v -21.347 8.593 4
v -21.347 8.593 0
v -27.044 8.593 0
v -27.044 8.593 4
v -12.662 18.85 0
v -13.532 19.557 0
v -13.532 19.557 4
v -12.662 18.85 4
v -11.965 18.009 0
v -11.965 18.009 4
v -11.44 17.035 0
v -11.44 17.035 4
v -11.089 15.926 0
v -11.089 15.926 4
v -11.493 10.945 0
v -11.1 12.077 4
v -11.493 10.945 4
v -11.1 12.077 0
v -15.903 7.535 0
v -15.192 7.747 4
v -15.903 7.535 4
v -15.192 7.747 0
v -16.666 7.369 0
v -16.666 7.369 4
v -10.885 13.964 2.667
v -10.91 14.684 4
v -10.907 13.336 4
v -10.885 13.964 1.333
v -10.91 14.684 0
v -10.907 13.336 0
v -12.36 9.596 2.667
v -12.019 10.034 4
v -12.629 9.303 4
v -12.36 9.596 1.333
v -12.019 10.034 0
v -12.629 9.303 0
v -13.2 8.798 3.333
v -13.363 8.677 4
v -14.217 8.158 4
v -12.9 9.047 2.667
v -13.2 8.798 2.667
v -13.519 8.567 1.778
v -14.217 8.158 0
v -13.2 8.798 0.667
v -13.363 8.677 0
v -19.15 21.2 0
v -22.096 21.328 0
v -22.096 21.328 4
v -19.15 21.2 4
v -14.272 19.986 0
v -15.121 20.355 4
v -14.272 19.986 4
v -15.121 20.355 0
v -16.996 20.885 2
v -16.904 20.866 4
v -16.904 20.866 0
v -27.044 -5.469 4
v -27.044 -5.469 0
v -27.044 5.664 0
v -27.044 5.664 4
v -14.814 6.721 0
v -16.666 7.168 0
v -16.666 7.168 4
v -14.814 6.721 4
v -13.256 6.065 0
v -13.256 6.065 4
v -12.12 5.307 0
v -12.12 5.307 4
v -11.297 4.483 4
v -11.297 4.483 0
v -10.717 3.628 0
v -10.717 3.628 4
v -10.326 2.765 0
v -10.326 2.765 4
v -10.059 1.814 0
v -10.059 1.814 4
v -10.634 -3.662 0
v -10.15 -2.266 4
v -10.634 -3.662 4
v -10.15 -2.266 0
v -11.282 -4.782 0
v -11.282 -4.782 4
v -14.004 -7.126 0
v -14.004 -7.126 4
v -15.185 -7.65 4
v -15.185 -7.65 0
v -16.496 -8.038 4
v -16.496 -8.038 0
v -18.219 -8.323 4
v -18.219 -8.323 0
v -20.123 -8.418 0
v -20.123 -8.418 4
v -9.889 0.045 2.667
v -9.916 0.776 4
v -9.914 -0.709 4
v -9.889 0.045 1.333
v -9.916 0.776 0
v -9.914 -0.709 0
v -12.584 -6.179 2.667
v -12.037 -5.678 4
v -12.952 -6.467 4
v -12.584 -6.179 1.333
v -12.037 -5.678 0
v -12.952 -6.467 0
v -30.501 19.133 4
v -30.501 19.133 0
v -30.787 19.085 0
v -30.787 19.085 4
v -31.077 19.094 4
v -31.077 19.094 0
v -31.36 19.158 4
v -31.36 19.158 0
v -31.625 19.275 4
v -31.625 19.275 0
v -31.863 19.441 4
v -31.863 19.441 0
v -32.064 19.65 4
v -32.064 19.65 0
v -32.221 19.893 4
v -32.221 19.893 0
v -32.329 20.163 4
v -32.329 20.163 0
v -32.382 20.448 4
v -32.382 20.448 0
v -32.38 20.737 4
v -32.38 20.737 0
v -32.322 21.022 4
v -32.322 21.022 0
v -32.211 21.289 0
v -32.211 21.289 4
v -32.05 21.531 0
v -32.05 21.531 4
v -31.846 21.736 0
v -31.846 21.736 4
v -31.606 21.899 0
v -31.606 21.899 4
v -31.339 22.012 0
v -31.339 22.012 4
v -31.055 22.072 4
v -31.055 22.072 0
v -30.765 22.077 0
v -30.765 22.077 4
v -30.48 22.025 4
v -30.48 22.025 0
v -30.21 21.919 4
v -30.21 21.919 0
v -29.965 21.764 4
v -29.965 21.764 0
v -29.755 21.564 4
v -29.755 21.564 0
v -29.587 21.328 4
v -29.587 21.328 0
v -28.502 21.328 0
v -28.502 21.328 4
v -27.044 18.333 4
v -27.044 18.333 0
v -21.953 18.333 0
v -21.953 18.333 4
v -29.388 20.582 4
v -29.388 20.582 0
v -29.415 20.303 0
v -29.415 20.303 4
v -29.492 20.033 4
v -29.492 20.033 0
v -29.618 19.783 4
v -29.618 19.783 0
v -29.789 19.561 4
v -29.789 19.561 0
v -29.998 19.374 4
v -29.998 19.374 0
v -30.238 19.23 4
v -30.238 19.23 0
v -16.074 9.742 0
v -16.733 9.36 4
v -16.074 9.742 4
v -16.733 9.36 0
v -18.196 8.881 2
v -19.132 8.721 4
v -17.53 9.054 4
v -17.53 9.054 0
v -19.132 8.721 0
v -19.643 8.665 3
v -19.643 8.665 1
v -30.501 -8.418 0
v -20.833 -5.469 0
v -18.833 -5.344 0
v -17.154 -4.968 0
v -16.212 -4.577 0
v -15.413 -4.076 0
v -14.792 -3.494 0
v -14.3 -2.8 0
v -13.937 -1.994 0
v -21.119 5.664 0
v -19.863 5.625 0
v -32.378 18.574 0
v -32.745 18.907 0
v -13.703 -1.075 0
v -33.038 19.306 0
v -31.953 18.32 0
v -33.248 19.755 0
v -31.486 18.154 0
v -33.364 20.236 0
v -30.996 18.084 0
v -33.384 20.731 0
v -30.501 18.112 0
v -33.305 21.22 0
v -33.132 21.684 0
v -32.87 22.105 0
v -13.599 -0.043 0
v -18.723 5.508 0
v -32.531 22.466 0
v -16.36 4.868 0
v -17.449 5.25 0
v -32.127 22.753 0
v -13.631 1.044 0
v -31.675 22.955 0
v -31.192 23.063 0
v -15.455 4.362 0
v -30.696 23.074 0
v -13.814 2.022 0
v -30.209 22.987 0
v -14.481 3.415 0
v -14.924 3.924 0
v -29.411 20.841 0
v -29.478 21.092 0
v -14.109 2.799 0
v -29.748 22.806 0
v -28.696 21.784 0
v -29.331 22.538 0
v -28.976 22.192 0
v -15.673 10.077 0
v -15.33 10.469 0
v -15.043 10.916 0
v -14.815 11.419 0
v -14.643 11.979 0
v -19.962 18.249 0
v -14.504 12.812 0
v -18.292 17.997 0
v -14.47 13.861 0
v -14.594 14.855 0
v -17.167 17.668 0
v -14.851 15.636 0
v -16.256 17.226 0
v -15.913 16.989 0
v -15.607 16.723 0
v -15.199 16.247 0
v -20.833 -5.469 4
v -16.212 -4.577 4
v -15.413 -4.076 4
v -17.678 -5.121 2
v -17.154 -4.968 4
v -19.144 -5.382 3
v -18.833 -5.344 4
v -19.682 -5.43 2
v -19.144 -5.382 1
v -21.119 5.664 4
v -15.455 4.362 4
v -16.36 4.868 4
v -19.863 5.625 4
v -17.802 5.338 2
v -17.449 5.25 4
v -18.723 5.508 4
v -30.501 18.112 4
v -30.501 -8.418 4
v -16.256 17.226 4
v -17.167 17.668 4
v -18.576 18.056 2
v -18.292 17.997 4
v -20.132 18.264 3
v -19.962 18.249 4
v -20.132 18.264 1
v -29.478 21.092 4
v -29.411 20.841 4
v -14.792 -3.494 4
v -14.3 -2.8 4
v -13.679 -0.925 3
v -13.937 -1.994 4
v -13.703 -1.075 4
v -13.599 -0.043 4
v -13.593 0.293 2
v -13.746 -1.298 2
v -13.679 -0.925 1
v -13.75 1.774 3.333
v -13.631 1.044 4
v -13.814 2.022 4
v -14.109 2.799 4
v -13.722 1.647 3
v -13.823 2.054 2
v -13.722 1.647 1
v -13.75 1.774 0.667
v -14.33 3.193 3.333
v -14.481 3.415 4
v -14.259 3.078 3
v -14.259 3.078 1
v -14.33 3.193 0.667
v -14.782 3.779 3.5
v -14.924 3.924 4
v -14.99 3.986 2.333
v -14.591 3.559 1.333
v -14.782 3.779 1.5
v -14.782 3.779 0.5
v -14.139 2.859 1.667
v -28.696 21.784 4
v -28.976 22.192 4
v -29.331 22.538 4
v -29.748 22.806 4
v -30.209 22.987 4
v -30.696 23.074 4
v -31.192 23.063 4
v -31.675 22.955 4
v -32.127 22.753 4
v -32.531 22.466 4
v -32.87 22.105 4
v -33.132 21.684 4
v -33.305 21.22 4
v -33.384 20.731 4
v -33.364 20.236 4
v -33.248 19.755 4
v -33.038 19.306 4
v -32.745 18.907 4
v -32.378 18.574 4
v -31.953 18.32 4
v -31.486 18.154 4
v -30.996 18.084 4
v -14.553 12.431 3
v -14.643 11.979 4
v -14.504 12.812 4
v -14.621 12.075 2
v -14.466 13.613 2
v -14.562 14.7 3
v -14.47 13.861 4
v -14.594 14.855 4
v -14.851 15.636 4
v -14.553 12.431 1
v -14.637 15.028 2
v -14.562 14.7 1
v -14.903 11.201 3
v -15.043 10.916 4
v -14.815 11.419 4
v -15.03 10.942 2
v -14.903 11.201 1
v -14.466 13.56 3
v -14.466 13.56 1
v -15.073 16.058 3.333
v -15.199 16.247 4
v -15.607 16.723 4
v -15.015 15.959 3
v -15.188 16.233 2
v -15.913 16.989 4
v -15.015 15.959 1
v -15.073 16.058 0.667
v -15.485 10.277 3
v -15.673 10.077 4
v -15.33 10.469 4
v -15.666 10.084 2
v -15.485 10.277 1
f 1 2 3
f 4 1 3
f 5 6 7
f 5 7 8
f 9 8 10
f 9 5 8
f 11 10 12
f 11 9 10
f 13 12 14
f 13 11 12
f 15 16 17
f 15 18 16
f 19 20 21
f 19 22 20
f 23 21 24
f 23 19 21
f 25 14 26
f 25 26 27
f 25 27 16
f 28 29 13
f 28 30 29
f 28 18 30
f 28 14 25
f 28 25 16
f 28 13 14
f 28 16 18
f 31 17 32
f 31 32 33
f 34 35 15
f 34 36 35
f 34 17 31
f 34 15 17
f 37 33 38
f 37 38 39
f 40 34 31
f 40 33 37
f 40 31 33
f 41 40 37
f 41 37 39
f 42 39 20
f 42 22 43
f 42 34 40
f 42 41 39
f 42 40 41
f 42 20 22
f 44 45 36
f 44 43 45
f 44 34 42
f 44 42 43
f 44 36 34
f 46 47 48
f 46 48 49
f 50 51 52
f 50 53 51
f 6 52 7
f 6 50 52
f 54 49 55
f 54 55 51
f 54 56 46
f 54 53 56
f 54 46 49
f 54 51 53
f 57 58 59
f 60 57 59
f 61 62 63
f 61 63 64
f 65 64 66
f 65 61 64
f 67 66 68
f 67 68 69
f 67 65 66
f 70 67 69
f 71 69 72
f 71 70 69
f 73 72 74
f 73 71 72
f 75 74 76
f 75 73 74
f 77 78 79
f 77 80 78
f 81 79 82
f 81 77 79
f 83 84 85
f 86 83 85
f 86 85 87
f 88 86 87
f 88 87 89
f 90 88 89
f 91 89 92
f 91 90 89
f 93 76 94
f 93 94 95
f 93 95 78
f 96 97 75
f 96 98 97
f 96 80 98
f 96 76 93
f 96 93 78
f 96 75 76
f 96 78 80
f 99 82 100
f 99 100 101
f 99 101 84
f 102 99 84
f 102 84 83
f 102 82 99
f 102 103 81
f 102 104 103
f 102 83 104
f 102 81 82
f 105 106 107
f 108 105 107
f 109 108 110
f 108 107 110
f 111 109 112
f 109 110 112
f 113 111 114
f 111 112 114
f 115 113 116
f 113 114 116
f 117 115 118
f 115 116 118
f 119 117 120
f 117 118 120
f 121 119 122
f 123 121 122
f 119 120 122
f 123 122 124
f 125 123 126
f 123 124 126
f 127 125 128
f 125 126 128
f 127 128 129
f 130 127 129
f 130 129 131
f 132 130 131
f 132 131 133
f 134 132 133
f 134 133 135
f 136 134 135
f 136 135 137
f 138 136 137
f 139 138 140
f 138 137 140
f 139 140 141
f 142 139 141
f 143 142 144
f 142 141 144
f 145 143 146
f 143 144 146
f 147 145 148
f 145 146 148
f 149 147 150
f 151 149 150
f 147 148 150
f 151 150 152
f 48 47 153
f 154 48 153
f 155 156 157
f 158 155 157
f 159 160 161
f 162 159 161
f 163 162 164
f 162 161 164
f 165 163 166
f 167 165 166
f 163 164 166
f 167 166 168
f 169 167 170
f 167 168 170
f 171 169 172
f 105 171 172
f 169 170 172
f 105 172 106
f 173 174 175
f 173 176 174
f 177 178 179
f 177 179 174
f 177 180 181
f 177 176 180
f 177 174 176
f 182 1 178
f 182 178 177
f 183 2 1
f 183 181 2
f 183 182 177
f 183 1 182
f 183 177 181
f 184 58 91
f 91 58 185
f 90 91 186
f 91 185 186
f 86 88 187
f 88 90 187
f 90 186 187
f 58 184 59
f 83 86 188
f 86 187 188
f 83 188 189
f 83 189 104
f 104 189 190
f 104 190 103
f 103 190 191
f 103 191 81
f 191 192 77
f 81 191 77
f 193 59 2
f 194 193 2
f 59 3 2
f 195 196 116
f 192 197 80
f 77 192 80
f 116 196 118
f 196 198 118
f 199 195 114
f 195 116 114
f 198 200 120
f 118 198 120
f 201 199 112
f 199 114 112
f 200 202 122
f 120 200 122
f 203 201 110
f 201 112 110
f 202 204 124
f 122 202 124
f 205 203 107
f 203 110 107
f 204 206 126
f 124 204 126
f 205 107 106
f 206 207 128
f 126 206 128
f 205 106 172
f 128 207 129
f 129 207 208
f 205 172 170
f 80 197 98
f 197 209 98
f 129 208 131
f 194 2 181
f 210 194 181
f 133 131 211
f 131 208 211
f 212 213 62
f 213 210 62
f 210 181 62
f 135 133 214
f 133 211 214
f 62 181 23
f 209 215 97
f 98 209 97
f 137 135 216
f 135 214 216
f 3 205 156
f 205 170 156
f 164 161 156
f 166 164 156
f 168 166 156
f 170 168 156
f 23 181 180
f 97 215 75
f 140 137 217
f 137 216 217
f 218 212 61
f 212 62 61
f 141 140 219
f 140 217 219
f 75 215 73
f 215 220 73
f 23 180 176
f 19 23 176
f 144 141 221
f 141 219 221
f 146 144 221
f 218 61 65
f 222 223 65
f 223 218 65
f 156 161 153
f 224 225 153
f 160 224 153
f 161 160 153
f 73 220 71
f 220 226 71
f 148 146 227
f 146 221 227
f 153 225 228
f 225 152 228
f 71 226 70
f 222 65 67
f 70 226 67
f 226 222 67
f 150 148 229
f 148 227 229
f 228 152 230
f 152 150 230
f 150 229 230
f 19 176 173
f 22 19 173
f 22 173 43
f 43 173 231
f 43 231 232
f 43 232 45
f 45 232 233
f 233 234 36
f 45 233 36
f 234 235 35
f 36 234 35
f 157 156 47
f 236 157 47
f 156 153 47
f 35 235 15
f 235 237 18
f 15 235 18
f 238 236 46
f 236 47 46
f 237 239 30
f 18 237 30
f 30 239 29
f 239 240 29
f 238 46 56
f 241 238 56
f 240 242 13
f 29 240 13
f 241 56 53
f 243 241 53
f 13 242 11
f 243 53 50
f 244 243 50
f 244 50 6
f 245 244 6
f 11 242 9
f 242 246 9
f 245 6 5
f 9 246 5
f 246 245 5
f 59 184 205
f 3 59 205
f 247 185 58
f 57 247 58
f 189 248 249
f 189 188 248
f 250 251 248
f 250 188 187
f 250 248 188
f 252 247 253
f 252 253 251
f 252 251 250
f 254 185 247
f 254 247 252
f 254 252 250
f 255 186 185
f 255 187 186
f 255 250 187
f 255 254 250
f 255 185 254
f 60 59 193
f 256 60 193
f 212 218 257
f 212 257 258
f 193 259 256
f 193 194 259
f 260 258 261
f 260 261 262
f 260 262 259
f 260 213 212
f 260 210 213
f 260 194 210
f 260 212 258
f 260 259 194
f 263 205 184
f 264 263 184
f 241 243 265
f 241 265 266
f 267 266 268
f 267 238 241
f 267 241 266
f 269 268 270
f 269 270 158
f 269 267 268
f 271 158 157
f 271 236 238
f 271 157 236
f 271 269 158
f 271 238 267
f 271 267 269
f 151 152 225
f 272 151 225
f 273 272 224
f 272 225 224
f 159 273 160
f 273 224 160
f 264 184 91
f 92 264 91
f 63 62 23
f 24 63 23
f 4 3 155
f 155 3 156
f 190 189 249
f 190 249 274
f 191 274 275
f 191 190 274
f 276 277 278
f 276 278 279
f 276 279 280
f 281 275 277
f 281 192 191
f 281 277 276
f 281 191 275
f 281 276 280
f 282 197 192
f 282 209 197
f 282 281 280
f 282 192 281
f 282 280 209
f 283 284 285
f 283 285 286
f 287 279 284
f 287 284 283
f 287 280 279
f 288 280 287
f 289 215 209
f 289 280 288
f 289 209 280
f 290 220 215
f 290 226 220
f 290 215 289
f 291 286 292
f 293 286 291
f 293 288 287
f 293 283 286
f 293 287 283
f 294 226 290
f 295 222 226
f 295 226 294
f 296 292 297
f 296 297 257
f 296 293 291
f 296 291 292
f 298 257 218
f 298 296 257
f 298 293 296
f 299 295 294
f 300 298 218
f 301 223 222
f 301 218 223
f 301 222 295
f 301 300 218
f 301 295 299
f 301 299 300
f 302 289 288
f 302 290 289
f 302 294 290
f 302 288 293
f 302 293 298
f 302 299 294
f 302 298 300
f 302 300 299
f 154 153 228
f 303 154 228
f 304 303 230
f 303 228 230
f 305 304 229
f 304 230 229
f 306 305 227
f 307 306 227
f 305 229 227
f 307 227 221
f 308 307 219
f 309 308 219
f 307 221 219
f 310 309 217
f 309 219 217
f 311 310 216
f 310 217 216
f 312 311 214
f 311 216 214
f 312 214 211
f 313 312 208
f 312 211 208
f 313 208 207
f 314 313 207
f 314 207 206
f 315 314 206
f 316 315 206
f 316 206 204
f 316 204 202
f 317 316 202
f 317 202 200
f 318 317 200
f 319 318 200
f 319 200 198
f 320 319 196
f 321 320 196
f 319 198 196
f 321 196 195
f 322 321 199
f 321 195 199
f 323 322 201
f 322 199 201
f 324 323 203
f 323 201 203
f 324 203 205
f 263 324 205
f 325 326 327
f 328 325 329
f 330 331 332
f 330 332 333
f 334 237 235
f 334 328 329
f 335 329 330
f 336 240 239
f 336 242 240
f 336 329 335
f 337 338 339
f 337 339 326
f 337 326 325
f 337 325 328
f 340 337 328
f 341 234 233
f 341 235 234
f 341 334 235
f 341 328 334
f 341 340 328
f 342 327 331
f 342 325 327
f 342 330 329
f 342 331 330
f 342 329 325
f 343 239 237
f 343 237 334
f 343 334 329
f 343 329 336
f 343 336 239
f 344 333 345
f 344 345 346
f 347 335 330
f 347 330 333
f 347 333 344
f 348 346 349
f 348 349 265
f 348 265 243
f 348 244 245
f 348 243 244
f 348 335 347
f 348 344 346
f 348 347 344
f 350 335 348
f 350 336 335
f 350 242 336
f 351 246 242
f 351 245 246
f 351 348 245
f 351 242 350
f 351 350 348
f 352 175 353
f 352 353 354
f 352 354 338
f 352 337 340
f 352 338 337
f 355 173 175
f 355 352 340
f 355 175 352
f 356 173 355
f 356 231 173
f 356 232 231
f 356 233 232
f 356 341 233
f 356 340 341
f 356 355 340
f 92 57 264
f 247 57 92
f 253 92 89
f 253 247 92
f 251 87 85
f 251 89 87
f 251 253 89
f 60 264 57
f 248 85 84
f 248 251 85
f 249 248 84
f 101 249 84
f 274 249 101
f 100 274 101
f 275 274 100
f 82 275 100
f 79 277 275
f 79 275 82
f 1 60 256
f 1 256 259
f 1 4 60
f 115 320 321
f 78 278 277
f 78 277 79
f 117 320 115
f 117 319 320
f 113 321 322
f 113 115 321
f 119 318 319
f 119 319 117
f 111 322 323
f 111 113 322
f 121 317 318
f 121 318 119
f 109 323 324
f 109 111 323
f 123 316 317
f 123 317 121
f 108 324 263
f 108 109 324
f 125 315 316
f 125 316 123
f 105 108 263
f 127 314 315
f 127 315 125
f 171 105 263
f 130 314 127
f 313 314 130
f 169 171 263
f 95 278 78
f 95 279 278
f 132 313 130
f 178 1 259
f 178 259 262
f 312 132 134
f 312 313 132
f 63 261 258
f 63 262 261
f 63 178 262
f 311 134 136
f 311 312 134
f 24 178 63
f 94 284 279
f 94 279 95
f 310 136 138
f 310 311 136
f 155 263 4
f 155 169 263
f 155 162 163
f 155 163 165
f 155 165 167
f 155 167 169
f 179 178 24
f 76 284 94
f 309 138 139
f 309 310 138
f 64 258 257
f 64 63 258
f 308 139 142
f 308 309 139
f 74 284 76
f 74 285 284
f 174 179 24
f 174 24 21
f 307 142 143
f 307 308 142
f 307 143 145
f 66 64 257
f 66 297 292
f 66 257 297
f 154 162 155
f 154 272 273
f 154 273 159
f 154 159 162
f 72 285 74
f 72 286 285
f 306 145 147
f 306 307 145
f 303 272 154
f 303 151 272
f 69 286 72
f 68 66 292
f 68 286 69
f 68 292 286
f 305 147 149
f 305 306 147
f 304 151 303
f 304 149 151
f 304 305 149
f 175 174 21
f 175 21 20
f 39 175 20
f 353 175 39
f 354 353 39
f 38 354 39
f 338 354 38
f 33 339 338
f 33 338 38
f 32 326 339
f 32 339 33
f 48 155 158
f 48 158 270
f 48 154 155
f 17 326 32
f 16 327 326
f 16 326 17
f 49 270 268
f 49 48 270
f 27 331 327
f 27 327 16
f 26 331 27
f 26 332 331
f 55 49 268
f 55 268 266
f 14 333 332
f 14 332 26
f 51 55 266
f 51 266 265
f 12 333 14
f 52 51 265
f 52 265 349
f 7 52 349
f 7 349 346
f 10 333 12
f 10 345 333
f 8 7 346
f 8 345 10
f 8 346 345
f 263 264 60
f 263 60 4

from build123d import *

# Parameters (mm, degrees)
F1_DEPTH = 4


with BuildPart() as f1:
    # F0 (on Top) → F1 (new body)
    with BuildSketch(Plane.XY):
        with BuildLine():
            ThreePointArc((-29.5870762934, 21.3277260357), (-29.4388915489, 20.9676838727), (-29.3883618563, 20.5816322857))
            ThreePointArc((-29.3883618563, 20.5816322857), (-29.6986024925, 19.6681375368), (-30.5009920647, 19.1325137106))
            Line((-30.5009920647, 19.1325137106), (-30.5009920647, 18.111825685))
            ThreePointArc((-30.5009920647, 18.111825685), (-28.988569173, 18.9565822063), (-28.3883618563, 20.5816322857))
            ThreePointArc((-28.3883618563, 20.5816322857), (-28.4170077365, 20.9590032096), (-28.5022889077, 21.3277260357))
            Line((-28.5022889077, 21.3277260357), (-29.5870762934, 21.3277260357))
        make_face()
        with BuildLine():
            ThreePointArc((-30.5009920647, 19.1325137106), (-32.2731465019, 21.1581489683), (-29.5870762934, 21.3277260357))
            Line((-29.5870762934, 21.3277260357), (-28.5022889077, 21.3277260357))
            ThreePointArc((-28.5022889077, 21.3277260357), (-33.0116847062, 21.9012913611), (-30.5009920647, 18.111825685))
            Line((-30.5009920647, 18.111825685), (-30.5009920647, 19.1325137106))
        make_face()
        with BuildLine():
            Line((-22.096044148, 21.3277260357), (-28.5022889077, 21.3277260357))
            ThreePointArc((-28.5022889077, 21.3277260357), (-28.4170077365, 20.9590032096), (-28.3883618563, 20.5816322857))
            ThreePointArc((-28.3883618563, 20.5816322857), (-28.988569173, 18.9565822063), (-30.5009920647, 18.111825685))
            Line((-30.5009920647, 18.111825685), (-30.5009920647, -8.4183677143))
            Line((-30.5009920647, -8.4183677143), (-20.123387898, -8.4183677143))
            add(Edge.make_bspline(
                [(-12.584325398, -6.178784381), (-15.279637898, -8.4183677143), (-20.123387898, -8.4183677143)],
                knots=[0, 0, 0, 1, 1, 1], degree=2))
            add(Edge.make_bspline(
                [(-9.889012898, 0.0451739523), (-9.889012898, -3.9392010477), (-12.584325398, -6.178784381)],
                knots=[0, 0, 0, 1, 1, 1], degree=2))
            add(Edge.make_bspline(
                [(-16.666356648, 7.1675697857), (-9.889012898, 6.008715619), (-9.889012898, 0.0451739523)],
                knots=[0, 0, 0, 1, 1, 1], degree=2))
            Line((-16.666356648, 7.1675697857), (-16.666356648, 7.3693927023))
            add(Edge.make_bspline(
                [(-12.359716023, 9.5959552023), (-13.834325398, 7.8772052023), (-16.666356648, 7.3693927023)],
                knots=[0, 0, 0, 1, 1, 1], degree=2))
            add(Edge.make_bspline(
                [(-10.885106648, 13.9644447857), (-10.885106648, 11.3147052023), (-12.359716023, 9.5959552023)],
                knots=[0, 0, 0, 1, 1, 1], degree=2))
            add(Edge.make_bspline(
                [(-13.531591023, 19.5568927023), (-10.885106648, 17.786059369), (-10.885106648, 13.9644447857)],
                knots=[0, 0, 0, 1, 1, 1], degree=2))
            add(Edge.make_bspline(
                [(-22.096044148, 21.3277260357), (-16.178075398, 21.3277260357), (-13.531591023, 19.5568927023)],
                knots=[0, 0, 0, 1, 1, 1], degree=2))
        make_face()
        with BuildLine():
            Line((-27.0439608147, -5.4691489643), (-27.0439608147, 5.6636635357))
            Line((-27.0439608147, 5.6636635357), (-21.119481648, 5.6636635357))
            add(Edge.make_bspline(
                [(-15.455419148, 4.3615802023), (-17.3173983147, 5.6636635357), (-21.119481648, 5.6636635357)],
                knots=[0, 0, 0, 1, 1, 1], degree=2))
            add(Edge.make_bspline(
                [(-13.5934399813, 0.2925697857), (-13.5934399813, 3.059496869), (-15.455419148, 4.3615802023)],
                knots=[0, 0, 0, 1, 1, 1], degree=2))
            add(Edge.make_bspline(
                [(-15.4131014397, -4.0759197977), (-13.5934399813, -2.682690631), (-13.5934399813, 0.2925697857)],
                knots=[0, 0, 0, 1, 1, 1], degree=2))
            add(Edge.make_bspline(
                [(-20.8330233147, -5.4691489643), (-17.232762898, -5.4691489643), (-15.4131014397, -4.0759197977)],
                knots=[0, 0, 0, 1, 1, 1], degree=2))
            Line((-20.8330233147, -5.4691489643), (-27.0439608147, -5.4691489643))
        make_face(mode=Mode.SUBTRACT)
        with BuildLine():
            Line((-21.3473462313, 8.5933510357), (-27.0439608147, 8.5933510357))
            Line((-27.0439608147, 8.5933510357), (-27.0439608147, 18.332934369))
            Line((-27.0439608147, 18.332934369), (-21.9528149813, 18.332934369))
            add(Edge.make_bspline(
                [(-16.256200398, 17.2261635357), (-18.0465649813, 18.332934369), (-21.9528149813, 18.332934369)],
                knots=[0, 0, 0, 1, 1, 1], degree=2))
            add(Edge.make_bspline(
                [(-14.4658358147, 13.6128822857), (-14.4658358147, 16.1193927023), (-16.256200398, 17.2261635357)],
                knots=[0, 0, 0, 1, 1, 1], degree=2))
            add(Edge.make_bspline(
                [(-16.0739087313, 9.7424395773), (-14.4658358147, 10.891528119), (-14.4658358147, 13.6128822857)],
                knots=[0, 0, 0, 1, 1, 1], degree=2))
            add(Edge.make_bspline(
                [(-21.3473462313, 8.5933510357), (-17.681981648, 8.5933510357), (-16.0739087313, 9.7424395773)],
                knots=[0, 0, 0, 1, 1, 1], degree=2))
        make_face(mode=Mode.SUBTRACT)
    extrude(amount=F1_DEPTH)


solid = f1.part
